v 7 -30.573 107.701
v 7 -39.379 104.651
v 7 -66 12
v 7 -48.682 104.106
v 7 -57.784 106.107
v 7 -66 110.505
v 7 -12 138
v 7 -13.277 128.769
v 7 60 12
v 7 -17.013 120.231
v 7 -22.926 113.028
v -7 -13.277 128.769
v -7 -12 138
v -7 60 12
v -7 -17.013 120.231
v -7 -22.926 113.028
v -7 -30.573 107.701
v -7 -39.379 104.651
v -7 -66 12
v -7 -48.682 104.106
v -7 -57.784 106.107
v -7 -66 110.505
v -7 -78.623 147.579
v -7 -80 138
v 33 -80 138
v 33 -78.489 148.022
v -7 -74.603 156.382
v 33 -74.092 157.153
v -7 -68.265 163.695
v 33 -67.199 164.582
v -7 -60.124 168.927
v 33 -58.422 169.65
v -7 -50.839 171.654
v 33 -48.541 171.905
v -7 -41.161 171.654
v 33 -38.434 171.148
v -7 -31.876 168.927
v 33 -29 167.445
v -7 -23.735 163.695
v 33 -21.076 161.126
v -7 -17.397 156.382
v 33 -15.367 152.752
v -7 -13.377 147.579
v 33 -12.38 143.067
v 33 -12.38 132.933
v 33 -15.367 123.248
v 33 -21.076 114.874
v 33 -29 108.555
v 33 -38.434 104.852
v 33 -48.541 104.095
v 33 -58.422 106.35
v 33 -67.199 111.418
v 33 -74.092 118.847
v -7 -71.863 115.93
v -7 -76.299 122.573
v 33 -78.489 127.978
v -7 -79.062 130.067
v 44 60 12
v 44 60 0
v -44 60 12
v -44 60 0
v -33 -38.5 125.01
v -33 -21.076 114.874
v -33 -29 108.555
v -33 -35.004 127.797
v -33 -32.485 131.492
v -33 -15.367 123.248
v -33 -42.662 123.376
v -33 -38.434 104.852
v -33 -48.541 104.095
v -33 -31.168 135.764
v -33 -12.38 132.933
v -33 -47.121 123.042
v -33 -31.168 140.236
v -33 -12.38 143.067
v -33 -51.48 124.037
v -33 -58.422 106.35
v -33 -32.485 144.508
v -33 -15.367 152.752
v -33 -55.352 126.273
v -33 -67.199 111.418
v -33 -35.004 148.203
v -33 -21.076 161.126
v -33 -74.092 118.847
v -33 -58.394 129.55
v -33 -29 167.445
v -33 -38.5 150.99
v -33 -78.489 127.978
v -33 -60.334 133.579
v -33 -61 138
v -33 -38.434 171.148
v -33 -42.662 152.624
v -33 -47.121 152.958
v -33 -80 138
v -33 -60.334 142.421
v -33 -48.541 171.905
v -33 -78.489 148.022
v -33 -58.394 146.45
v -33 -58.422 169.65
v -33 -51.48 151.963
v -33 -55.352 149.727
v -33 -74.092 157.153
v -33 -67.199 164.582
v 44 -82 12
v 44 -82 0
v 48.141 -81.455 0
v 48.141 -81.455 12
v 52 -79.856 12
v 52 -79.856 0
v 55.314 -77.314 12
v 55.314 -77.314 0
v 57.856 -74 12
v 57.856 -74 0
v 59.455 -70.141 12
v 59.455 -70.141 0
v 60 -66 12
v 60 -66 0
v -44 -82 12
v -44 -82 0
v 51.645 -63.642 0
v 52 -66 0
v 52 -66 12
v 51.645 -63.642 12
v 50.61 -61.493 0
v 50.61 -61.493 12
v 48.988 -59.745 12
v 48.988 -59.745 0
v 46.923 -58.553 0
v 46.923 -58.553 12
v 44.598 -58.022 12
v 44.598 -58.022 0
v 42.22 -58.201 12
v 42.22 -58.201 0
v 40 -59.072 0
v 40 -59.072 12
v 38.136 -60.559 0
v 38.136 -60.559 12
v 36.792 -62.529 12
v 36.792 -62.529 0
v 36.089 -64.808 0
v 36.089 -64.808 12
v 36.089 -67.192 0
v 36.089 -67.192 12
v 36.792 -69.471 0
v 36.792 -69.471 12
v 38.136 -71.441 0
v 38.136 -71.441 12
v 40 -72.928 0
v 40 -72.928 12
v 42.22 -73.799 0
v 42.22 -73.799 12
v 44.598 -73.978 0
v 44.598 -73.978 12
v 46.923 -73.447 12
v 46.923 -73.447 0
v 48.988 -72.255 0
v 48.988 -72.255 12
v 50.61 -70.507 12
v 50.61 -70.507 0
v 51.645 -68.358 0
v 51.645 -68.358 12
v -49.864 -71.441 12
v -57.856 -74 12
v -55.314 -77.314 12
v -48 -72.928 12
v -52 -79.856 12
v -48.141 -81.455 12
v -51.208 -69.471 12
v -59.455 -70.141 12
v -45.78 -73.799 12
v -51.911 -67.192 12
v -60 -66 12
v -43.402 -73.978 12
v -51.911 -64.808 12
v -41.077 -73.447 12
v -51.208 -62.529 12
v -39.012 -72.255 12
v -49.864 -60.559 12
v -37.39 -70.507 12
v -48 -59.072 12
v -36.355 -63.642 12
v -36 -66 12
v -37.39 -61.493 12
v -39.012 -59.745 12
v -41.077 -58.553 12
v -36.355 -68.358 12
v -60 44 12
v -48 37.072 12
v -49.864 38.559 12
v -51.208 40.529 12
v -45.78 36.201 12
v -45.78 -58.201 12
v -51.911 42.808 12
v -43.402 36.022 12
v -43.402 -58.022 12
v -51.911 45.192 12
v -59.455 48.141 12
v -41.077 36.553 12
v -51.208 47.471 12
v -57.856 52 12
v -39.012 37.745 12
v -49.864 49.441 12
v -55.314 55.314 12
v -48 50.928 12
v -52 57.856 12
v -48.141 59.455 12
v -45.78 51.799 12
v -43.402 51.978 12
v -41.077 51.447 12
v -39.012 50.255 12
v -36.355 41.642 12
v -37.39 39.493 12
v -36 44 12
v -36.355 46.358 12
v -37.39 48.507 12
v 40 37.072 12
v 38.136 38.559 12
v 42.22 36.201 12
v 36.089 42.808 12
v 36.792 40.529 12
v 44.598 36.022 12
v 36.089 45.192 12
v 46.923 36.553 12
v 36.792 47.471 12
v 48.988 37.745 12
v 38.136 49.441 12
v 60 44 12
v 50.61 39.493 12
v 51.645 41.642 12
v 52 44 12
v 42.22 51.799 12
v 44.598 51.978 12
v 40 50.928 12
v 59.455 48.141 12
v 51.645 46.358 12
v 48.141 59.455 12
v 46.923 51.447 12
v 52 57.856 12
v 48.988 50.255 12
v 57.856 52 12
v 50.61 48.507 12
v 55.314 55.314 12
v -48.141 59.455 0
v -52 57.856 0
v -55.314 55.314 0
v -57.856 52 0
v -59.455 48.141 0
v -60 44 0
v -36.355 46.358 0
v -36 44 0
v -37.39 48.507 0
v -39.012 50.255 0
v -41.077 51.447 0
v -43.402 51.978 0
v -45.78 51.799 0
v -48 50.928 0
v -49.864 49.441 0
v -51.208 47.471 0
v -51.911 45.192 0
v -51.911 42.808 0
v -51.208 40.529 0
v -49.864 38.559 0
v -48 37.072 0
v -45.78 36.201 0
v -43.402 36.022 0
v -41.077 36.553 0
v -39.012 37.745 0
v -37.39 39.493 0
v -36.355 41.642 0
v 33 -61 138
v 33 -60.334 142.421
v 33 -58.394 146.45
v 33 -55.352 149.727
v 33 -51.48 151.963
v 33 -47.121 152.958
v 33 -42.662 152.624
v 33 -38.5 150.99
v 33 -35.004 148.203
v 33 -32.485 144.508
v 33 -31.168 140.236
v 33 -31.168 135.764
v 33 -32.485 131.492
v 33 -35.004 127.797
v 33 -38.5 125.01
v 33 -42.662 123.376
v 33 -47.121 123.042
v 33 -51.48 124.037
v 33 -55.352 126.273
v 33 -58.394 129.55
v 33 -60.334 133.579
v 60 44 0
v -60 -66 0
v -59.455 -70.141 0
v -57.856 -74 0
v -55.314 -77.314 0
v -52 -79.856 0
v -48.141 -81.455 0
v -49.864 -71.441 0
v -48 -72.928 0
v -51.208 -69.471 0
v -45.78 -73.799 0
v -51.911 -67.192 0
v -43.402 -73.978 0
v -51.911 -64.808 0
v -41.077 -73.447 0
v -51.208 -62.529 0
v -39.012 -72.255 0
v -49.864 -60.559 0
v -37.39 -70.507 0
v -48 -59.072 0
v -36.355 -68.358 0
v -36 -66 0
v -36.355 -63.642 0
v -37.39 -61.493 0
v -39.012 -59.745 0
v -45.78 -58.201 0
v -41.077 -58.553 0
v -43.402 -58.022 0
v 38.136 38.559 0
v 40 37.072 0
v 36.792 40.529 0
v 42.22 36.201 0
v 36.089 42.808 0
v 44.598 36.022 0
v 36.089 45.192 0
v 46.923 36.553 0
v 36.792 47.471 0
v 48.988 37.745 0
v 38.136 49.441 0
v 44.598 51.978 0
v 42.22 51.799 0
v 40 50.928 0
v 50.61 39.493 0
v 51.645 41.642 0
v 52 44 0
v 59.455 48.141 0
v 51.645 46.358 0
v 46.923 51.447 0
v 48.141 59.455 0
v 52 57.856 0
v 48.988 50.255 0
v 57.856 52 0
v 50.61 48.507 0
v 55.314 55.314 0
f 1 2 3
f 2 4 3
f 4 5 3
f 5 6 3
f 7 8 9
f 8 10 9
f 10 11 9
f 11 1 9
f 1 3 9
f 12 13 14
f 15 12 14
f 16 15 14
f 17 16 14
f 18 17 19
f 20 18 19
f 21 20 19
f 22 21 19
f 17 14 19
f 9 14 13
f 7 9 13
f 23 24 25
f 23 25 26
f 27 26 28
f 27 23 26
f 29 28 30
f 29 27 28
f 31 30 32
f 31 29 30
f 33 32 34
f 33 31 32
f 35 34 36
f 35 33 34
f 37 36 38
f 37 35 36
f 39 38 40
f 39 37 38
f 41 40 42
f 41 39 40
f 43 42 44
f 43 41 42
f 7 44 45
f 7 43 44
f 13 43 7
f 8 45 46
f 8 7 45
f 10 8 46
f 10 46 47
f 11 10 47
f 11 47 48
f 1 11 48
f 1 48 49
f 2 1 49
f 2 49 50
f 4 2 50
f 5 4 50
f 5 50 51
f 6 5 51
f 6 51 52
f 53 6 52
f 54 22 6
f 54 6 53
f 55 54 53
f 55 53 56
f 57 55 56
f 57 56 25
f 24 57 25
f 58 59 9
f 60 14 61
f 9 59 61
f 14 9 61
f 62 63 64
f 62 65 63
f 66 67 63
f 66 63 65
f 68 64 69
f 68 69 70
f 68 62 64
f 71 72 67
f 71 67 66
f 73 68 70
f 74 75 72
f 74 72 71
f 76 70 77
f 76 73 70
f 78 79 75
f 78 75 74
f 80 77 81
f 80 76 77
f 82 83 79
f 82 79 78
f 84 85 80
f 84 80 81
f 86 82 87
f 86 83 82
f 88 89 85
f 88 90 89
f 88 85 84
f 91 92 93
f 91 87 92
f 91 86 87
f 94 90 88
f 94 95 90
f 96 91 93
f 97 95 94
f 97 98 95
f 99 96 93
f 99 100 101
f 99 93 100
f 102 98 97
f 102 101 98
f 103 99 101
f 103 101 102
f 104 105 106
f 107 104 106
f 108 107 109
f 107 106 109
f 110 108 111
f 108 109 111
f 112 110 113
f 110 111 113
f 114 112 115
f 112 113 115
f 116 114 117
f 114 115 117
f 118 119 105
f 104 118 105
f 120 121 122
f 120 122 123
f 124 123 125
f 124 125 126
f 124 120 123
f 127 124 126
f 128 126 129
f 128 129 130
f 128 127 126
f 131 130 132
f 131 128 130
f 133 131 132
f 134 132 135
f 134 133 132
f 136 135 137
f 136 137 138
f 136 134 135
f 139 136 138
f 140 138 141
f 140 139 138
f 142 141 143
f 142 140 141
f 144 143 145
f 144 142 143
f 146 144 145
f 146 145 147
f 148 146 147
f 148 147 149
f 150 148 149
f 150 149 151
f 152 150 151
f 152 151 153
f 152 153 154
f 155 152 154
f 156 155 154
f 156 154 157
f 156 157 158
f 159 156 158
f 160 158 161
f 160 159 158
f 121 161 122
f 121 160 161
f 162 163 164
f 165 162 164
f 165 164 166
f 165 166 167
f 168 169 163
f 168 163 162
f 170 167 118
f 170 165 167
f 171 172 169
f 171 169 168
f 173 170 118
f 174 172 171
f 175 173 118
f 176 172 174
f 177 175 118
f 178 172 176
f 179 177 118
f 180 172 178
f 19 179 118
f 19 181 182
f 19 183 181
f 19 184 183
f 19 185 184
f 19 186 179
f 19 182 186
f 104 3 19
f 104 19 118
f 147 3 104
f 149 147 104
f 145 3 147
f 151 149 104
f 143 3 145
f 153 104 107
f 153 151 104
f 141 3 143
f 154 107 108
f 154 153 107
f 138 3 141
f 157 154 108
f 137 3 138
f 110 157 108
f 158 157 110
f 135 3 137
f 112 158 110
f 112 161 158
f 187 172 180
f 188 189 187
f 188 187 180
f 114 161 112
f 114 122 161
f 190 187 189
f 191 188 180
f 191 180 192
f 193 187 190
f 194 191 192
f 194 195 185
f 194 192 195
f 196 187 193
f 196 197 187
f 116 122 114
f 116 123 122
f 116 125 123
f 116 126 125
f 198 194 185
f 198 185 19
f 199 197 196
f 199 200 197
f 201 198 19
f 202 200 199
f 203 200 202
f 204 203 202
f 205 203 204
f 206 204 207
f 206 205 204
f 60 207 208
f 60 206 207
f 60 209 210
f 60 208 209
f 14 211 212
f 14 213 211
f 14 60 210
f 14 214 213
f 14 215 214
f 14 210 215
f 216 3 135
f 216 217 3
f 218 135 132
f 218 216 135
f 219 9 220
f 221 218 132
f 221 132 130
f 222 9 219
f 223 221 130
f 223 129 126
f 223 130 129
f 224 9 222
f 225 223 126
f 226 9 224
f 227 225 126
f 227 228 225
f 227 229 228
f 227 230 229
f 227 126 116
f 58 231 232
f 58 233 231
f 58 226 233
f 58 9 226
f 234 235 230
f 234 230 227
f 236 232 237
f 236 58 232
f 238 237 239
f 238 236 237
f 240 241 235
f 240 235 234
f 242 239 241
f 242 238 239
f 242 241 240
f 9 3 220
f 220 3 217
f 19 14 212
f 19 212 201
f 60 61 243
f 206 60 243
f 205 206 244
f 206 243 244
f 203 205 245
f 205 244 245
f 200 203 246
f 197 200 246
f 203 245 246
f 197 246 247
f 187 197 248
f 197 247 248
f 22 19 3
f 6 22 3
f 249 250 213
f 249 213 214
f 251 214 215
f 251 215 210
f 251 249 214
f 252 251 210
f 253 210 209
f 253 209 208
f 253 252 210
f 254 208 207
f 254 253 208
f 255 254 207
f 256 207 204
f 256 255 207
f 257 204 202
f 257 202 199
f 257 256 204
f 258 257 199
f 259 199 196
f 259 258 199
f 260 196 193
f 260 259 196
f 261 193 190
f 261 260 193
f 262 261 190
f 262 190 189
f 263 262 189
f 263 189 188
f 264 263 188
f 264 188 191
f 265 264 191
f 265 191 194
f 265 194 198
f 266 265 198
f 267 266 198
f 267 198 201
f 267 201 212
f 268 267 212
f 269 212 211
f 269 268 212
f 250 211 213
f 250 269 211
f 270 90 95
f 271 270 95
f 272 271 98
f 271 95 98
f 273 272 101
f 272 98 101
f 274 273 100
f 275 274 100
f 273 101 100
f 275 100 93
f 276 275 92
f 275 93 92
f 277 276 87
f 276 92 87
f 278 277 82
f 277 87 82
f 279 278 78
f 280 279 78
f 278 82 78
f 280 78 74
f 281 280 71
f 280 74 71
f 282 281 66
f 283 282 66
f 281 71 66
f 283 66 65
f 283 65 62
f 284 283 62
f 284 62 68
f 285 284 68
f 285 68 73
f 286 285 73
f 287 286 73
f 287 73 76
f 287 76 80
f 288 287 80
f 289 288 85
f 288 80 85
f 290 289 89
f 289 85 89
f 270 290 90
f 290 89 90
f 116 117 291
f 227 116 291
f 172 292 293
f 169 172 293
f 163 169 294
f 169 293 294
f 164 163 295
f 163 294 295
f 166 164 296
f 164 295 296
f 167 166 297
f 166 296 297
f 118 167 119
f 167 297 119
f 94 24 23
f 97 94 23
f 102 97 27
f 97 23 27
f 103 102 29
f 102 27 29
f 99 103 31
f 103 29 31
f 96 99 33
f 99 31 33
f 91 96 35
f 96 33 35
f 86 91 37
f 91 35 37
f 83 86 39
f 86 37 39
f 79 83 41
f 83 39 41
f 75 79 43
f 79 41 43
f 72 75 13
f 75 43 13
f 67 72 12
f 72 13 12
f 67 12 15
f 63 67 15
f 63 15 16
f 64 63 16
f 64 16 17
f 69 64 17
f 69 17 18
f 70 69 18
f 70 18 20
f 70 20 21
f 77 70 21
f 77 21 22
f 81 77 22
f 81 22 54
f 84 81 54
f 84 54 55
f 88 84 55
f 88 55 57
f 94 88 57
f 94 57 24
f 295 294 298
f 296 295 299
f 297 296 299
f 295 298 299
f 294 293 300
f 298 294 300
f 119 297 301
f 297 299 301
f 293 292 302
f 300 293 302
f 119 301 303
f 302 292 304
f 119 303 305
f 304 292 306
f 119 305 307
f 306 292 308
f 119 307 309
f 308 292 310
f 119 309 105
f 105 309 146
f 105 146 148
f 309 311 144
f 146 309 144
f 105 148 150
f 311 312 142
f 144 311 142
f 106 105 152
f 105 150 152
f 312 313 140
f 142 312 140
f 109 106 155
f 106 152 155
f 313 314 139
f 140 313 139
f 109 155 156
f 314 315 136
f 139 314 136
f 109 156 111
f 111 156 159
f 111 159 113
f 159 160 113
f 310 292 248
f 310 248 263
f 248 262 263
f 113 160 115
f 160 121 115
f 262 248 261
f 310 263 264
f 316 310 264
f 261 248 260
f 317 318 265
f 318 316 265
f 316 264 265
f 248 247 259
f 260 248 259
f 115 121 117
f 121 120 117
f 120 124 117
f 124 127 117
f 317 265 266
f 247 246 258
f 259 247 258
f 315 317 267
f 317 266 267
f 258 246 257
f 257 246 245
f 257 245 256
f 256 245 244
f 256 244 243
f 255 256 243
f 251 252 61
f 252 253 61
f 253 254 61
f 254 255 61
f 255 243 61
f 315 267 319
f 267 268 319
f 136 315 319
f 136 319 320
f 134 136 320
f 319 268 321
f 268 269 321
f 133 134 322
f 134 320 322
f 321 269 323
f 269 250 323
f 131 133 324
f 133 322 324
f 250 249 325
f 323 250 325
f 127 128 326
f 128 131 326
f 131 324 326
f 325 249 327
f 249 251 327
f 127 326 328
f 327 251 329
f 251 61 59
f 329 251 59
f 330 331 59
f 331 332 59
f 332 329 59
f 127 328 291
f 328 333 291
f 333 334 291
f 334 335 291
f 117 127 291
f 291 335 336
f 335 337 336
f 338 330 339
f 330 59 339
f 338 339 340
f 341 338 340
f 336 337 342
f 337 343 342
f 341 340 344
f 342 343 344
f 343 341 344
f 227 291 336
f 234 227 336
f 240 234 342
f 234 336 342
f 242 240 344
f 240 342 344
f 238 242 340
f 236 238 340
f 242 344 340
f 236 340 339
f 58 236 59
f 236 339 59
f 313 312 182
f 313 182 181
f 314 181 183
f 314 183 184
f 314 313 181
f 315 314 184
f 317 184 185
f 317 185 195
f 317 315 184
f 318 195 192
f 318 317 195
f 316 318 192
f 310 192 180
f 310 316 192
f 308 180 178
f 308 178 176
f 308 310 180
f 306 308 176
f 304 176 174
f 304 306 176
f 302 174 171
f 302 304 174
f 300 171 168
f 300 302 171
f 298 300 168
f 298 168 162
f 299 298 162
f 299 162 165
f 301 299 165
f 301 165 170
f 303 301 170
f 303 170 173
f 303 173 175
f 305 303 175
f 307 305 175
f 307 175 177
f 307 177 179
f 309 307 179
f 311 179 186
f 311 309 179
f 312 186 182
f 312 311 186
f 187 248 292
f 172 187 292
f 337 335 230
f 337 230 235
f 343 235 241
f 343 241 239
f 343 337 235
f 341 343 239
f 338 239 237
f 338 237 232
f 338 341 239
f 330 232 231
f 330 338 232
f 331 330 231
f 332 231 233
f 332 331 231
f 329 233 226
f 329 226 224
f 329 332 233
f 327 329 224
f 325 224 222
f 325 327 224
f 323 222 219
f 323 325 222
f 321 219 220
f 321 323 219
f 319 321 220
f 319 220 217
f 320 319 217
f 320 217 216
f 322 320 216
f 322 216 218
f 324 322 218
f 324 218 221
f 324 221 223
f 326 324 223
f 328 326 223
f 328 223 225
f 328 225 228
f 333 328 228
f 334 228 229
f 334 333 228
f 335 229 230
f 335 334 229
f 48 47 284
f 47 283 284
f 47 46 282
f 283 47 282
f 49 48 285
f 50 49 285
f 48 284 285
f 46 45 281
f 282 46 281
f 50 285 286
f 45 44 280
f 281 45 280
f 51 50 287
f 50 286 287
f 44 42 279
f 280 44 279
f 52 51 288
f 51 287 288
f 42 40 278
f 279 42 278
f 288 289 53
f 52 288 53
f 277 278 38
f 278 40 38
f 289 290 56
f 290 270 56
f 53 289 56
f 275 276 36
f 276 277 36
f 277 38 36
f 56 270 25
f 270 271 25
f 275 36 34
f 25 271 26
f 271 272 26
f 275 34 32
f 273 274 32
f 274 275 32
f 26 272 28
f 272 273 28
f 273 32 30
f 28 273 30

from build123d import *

# Parameters (mm, degrees)
F0_R      = 8
F1_DEPTH  = 12
F3_DEPTH  = 126
F4_R      = 34
F5_DEPTH  = 26
F6_DEPTH  = 40
F7_R      = 15
F8_DEPTH  = 66
F10_DEPTH = 14


with BuildPart() as f1:
    # F0 (on Top) → F1 (new body)
    with BuildSketch(Plane.XY):
        with BuildLine():
            ThreePointArc((-60, -66), (-55.313708, -77.313708), (-44, -82))
            Line((-44, -82), (44, -82))
            ThreePointArc((44, -82), (55.313708, -77.313708), (60, -66))
            Line((60, -66), (60, 44))
            ThreePointArc((60, 44), (55.313708, 55.313708), (44, 60))
            Line((44, 60), (0, 60))
            Line((0, 60), (-44, 60))
            ThreePointArc((-44, 60), (-55.313708, 55.313708), (-60, 44))
            Line((-60, 44), (-60, -66))
        make_face()
        with Locations((-44, -66)):
            Circle(F0_R, mode=Mode.SUBTRACT)
        with Locations((44, -66)):
            Circle(F0_R, mode=Mode.SUBTRACT)
        with Locations((-44, 44)):
            Circle(F0_R, mode=Mode.SUBTRACT)
        with Locations((44, 44)):
            Circle(F0_R, mode=Mode.SUBTRACT)
    extrude(amount=F1_DEPTH)

    # F2 (on face) → F3 (join)
    with BuildSketch(Plane.XY.offset(12)):
        Polygon((7, 60), (0, 60), (-7, 60), (-7, -66), (7, -66), align=None)
    extrude(amount=F3_DEPTH)

    # F4 (on face) → F5 (join)
    with BuildSketch(Plane(origin=(-7, 0, 0), x_dir=(0, -1, 0), z_dir=(-1, 0, 0))):
        with Locations((46, 138)):
            Circle(F4_R)
    extrude(amount=F5_DEPTH)

    # F4 (on face) → F6 (join)
    with BuildSketch(Plane(origin=(-7, 0, 0), x_dir=(0, -1, 0), z_dir=(-1, 0, 0))):
        with Locations((46, 138)):
            Circle(F4_R)
    extrude(amount=-F6_DEPTH)

    # F7 (on face) → F8 (cut)
    with BuildSketch(Plane(origin=(-33, 0, 0), x_dir=(0, -1, 0), z_dir=(-1, 0, 0))):
        with Locations((46, 138)):
            Circle(F7_R)
    extrude(amount=-F8_DEPTH, mode=Mode.SUBTRACT)

    # F9 (on face) → F10 (cut)
    with BuildSketch(Plane(origin=(-7, 0, 0), x_dir=(0, -1, 0), z_dir=(-1, 0, 0))):
        Polygon((-60, 12), (12, 138), (-60, 138), align=None)
    extrude(amount=-F10_DEPTH, mode=Mode.SUBTRACT)


solid = f1.part
